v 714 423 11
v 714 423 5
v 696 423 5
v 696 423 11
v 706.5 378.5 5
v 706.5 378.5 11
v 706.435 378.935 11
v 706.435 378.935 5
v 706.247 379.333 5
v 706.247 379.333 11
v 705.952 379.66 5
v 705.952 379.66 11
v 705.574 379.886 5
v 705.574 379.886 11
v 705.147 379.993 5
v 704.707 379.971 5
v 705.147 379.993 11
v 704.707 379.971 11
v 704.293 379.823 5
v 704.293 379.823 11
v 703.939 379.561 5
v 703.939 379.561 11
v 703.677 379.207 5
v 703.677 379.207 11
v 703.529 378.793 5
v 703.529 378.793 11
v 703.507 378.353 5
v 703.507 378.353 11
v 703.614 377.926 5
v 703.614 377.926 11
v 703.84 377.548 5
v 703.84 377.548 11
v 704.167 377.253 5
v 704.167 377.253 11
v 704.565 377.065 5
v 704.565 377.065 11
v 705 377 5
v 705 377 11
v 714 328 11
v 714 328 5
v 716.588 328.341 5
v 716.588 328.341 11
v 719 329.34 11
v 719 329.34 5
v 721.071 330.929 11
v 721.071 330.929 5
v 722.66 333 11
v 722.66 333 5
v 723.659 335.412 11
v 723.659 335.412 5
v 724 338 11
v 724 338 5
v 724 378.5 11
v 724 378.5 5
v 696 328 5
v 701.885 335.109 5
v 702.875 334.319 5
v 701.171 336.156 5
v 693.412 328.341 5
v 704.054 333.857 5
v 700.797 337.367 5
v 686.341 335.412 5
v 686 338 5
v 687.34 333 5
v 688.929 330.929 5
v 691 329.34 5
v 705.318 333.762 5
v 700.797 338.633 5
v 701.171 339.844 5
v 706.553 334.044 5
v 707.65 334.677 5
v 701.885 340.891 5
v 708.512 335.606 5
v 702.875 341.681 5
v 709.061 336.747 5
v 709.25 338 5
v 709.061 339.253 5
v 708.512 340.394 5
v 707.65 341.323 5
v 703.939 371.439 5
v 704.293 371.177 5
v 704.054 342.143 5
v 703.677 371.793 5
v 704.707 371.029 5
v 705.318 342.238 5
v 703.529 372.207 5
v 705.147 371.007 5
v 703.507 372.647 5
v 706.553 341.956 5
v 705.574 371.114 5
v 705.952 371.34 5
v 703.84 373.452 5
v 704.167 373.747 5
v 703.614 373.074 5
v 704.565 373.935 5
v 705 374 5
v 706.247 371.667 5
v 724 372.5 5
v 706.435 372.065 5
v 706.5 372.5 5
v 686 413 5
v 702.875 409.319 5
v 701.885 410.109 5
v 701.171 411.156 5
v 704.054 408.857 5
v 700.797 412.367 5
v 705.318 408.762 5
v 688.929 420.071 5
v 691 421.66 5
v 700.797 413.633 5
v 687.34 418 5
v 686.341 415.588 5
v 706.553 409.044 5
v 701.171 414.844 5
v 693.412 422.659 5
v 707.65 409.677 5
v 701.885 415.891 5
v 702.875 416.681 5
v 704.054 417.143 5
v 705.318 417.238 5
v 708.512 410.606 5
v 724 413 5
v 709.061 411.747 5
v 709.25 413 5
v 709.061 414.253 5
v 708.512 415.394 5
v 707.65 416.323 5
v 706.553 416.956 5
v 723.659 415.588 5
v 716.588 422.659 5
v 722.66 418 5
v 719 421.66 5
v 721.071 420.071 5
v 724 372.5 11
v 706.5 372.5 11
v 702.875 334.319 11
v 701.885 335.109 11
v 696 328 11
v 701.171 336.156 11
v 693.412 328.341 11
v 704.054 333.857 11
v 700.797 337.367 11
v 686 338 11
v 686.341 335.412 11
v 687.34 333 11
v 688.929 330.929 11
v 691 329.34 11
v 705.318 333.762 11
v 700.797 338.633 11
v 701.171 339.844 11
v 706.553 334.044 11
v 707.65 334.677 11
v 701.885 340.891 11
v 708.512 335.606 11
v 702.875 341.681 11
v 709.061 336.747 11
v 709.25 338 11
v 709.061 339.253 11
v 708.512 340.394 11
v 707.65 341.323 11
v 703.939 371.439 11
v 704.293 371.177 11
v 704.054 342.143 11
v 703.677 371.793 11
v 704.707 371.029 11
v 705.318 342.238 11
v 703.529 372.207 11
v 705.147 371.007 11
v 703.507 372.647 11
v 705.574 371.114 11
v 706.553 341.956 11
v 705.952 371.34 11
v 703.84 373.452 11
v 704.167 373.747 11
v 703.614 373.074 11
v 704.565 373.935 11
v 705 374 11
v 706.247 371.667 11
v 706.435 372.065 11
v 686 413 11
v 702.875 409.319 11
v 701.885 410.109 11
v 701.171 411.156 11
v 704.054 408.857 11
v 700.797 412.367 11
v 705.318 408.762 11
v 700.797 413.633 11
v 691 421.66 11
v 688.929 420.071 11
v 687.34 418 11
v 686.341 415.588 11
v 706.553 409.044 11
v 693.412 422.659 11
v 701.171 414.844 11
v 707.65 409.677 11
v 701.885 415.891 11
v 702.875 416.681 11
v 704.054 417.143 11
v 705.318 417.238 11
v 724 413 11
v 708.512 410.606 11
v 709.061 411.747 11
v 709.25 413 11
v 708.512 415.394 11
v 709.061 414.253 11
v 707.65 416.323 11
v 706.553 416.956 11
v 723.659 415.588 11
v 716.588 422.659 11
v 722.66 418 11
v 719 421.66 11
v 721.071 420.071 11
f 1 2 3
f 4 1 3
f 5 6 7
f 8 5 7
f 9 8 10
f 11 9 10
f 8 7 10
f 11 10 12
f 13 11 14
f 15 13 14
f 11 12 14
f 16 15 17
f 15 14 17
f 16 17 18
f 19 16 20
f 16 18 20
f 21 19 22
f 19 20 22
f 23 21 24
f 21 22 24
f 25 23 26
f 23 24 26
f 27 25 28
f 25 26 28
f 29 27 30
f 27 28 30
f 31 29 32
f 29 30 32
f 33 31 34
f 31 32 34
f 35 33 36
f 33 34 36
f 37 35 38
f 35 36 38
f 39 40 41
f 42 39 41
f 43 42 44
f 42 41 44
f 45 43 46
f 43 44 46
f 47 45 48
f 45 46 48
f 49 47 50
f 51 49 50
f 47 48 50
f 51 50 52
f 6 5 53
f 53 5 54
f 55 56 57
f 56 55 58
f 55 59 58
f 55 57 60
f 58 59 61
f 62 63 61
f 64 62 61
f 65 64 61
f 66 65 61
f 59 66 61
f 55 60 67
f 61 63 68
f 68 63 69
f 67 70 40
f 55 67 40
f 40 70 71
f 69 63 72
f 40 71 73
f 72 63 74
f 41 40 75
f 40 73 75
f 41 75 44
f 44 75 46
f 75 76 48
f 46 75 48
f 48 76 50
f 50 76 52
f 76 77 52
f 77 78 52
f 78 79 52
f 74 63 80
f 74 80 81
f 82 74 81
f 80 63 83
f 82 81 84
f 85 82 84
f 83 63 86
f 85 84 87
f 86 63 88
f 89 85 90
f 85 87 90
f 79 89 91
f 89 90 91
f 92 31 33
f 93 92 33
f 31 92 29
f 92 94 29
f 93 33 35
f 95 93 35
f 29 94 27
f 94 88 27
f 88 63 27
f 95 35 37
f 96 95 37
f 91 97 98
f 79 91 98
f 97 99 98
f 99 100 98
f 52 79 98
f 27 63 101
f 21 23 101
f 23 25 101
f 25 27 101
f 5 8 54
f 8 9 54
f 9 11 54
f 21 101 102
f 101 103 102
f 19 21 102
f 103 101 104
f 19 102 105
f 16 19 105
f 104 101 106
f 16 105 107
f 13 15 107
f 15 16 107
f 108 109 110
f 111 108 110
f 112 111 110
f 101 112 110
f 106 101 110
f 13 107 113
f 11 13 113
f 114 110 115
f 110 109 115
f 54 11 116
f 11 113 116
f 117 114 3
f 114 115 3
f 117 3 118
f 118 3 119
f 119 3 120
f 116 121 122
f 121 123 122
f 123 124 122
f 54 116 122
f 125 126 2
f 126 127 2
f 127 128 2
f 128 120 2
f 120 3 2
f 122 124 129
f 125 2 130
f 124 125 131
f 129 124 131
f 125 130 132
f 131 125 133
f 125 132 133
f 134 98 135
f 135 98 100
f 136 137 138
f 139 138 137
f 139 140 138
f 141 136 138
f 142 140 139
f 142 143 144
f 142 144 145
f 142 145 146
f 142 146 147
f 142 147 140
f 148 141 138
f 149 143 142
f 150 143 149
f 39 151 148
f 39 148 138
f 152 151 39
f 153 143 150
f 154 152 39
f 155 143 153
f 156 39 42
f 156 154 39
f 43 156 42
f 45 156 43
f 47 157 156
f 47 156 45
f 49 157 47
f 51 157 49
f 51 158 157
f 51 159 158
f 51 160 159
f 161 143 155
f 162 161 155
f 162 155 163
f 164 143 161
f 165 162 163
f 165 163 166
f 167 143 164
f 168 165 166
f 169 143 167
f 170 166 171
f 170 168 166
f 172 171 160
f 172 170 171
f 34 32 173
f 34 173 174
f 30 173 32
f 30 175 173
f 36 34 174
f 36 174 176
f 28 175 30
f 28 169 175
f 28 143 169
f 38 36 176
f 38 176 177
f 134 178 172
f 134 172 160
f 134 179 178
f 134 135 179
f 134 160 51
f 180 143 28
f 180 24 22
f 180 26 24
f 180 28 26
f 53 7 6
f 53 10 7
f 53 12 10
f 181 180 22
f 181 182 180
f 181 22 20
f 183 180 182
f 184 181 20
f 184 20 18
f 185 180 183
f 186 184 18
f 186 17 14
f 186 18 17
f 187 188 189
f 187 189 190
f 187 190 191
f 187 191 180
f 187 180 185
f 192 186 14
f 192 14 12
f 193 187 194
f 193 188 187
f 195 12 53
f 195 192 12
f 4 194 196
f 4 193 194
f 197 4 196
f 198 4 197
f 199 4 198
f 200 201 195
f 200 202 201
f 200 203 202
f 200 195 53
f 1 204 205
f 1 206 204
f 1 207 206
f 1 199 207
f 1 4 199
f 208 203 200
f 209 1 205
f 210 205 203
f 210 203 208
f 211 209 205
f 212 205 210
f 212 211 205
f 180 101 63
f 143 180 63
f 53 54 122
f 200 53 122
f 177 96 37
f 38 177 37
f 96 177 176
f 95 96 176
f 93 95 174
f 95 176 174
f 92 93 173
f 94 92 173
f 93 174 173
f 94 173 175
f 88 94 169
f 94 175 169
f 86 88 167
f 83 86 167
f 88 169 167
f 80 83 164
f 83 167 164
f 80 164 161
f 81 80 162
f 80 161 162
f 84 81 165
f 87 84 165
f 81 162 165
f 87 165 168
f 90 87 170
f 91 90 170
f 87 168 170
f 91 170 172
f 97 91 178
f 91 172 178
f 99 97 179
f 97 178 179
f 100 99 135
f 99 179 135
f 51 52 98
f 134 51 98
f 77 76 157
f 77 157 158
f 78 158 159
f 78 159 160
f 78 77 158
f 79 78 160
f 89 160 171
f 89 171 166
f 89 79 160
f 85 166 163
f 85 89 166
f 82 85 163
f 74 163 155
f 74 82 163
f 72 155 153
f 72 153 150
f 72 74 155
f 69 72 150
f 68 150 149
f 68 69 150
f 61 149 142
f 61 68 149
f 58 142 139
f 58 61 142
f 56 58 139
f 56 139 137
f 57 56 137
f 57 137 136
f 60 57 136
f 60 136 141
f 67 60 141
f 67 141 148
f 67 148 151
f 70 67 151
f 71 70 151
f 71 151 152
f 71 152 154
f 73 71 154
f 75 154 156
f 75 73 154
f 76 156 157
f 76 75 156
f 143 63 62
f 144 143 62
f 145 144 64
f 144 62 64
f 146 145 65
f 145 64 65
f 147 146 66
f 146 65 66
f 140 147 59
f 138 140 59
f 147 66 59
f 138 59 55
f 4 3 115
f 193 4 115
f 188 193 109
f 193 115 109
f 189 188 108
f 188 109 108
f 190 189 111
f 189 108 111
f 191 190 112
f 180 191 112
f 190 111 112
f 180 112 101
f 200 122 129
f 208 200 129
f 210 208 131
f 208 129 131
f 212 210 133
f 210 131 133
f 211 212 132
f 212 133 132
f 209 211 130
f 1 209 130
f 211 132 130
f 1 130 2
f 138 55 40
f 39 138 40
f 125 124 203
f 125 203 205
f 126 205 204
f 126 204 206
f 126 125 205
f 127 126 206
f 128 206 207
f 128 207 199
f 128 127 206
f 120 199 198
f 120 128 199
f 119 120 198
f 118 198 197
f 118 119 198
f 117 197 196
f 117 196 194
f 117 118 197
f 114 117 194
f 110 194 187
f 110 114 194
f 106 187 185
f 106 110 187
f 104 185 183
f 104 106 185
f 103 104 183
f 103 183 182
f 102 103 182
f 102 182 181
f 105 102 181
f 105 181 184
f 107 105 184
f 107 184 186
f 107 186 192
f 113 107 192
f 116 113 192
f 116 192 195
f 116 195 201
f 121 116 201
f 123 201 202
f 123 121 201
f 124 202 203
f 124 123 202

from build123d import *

# Parameters (mm, degrees)
BOSS_EXTRUDE1_START = 5
SKETCH1_R           = 4.25
BOSS_EXTRUDE1_DEPTH = 6
SKETCH3_R           = 1.5
CUT_EXTRUDE1_DEPTH  = 839.535032065


with BuildPart() as part:
    # Sketch1 → Boss-Extrude1 (new body)
    with BuildSketch(Plane.XY.offset(BOSS_EXTRUDE1_START)):
        with BuildLine():
            Line((724, 378.5), (724, 413))
            ThreePointArc((724, 413), (721.071067812, 420.071067812), (714, 423))
            Line((714, 423), (696, 423))
            ThreePointArc((696, 423), (688.928932188, 420.071067812), (686, 413))
            Line((686, 413), (686, 338))
            ThreePointArc((686, 338), (688.928932188, 330.928932188), (696, 328))
            Line((696, 328), (714, 328))
            ThreePointArc((714, 328), (721.071067812, 330.928932188), (724, 338))
            Line((724, 338), (724, 372.5))
            Line((724, 372.5), (705, 372.5))
            Line((705, 372.5), (705, 378.5))
            Line((705, 378.5), (724, 378.5))
        make_face()
        with Locations((705, 338)):
            Circle(SKETCH1_R, mode=Mode.SUBTRACT)
        with Locations((705, 413)):
            Circle(SKETCH1_R, mode=Mode.SUBTRACT)
    extrude(amount=BOSS_EXTRUDE1_DEPTH)

    # Sketch3 → Cut-Extrude1 (cut, through all)
    with BuildSketch(Plane.XY.offset(11)):
        with Locations((705, 378.5)):
            Circle(SKETCH3_R)
        with Locations((705, 372.5)):
            Circle(SKETCH3_R)
    extrude(amount=-CUT_EXTRUDE1_DEPTH, mode=Mode.SUBTRACT)


solid = part.part
